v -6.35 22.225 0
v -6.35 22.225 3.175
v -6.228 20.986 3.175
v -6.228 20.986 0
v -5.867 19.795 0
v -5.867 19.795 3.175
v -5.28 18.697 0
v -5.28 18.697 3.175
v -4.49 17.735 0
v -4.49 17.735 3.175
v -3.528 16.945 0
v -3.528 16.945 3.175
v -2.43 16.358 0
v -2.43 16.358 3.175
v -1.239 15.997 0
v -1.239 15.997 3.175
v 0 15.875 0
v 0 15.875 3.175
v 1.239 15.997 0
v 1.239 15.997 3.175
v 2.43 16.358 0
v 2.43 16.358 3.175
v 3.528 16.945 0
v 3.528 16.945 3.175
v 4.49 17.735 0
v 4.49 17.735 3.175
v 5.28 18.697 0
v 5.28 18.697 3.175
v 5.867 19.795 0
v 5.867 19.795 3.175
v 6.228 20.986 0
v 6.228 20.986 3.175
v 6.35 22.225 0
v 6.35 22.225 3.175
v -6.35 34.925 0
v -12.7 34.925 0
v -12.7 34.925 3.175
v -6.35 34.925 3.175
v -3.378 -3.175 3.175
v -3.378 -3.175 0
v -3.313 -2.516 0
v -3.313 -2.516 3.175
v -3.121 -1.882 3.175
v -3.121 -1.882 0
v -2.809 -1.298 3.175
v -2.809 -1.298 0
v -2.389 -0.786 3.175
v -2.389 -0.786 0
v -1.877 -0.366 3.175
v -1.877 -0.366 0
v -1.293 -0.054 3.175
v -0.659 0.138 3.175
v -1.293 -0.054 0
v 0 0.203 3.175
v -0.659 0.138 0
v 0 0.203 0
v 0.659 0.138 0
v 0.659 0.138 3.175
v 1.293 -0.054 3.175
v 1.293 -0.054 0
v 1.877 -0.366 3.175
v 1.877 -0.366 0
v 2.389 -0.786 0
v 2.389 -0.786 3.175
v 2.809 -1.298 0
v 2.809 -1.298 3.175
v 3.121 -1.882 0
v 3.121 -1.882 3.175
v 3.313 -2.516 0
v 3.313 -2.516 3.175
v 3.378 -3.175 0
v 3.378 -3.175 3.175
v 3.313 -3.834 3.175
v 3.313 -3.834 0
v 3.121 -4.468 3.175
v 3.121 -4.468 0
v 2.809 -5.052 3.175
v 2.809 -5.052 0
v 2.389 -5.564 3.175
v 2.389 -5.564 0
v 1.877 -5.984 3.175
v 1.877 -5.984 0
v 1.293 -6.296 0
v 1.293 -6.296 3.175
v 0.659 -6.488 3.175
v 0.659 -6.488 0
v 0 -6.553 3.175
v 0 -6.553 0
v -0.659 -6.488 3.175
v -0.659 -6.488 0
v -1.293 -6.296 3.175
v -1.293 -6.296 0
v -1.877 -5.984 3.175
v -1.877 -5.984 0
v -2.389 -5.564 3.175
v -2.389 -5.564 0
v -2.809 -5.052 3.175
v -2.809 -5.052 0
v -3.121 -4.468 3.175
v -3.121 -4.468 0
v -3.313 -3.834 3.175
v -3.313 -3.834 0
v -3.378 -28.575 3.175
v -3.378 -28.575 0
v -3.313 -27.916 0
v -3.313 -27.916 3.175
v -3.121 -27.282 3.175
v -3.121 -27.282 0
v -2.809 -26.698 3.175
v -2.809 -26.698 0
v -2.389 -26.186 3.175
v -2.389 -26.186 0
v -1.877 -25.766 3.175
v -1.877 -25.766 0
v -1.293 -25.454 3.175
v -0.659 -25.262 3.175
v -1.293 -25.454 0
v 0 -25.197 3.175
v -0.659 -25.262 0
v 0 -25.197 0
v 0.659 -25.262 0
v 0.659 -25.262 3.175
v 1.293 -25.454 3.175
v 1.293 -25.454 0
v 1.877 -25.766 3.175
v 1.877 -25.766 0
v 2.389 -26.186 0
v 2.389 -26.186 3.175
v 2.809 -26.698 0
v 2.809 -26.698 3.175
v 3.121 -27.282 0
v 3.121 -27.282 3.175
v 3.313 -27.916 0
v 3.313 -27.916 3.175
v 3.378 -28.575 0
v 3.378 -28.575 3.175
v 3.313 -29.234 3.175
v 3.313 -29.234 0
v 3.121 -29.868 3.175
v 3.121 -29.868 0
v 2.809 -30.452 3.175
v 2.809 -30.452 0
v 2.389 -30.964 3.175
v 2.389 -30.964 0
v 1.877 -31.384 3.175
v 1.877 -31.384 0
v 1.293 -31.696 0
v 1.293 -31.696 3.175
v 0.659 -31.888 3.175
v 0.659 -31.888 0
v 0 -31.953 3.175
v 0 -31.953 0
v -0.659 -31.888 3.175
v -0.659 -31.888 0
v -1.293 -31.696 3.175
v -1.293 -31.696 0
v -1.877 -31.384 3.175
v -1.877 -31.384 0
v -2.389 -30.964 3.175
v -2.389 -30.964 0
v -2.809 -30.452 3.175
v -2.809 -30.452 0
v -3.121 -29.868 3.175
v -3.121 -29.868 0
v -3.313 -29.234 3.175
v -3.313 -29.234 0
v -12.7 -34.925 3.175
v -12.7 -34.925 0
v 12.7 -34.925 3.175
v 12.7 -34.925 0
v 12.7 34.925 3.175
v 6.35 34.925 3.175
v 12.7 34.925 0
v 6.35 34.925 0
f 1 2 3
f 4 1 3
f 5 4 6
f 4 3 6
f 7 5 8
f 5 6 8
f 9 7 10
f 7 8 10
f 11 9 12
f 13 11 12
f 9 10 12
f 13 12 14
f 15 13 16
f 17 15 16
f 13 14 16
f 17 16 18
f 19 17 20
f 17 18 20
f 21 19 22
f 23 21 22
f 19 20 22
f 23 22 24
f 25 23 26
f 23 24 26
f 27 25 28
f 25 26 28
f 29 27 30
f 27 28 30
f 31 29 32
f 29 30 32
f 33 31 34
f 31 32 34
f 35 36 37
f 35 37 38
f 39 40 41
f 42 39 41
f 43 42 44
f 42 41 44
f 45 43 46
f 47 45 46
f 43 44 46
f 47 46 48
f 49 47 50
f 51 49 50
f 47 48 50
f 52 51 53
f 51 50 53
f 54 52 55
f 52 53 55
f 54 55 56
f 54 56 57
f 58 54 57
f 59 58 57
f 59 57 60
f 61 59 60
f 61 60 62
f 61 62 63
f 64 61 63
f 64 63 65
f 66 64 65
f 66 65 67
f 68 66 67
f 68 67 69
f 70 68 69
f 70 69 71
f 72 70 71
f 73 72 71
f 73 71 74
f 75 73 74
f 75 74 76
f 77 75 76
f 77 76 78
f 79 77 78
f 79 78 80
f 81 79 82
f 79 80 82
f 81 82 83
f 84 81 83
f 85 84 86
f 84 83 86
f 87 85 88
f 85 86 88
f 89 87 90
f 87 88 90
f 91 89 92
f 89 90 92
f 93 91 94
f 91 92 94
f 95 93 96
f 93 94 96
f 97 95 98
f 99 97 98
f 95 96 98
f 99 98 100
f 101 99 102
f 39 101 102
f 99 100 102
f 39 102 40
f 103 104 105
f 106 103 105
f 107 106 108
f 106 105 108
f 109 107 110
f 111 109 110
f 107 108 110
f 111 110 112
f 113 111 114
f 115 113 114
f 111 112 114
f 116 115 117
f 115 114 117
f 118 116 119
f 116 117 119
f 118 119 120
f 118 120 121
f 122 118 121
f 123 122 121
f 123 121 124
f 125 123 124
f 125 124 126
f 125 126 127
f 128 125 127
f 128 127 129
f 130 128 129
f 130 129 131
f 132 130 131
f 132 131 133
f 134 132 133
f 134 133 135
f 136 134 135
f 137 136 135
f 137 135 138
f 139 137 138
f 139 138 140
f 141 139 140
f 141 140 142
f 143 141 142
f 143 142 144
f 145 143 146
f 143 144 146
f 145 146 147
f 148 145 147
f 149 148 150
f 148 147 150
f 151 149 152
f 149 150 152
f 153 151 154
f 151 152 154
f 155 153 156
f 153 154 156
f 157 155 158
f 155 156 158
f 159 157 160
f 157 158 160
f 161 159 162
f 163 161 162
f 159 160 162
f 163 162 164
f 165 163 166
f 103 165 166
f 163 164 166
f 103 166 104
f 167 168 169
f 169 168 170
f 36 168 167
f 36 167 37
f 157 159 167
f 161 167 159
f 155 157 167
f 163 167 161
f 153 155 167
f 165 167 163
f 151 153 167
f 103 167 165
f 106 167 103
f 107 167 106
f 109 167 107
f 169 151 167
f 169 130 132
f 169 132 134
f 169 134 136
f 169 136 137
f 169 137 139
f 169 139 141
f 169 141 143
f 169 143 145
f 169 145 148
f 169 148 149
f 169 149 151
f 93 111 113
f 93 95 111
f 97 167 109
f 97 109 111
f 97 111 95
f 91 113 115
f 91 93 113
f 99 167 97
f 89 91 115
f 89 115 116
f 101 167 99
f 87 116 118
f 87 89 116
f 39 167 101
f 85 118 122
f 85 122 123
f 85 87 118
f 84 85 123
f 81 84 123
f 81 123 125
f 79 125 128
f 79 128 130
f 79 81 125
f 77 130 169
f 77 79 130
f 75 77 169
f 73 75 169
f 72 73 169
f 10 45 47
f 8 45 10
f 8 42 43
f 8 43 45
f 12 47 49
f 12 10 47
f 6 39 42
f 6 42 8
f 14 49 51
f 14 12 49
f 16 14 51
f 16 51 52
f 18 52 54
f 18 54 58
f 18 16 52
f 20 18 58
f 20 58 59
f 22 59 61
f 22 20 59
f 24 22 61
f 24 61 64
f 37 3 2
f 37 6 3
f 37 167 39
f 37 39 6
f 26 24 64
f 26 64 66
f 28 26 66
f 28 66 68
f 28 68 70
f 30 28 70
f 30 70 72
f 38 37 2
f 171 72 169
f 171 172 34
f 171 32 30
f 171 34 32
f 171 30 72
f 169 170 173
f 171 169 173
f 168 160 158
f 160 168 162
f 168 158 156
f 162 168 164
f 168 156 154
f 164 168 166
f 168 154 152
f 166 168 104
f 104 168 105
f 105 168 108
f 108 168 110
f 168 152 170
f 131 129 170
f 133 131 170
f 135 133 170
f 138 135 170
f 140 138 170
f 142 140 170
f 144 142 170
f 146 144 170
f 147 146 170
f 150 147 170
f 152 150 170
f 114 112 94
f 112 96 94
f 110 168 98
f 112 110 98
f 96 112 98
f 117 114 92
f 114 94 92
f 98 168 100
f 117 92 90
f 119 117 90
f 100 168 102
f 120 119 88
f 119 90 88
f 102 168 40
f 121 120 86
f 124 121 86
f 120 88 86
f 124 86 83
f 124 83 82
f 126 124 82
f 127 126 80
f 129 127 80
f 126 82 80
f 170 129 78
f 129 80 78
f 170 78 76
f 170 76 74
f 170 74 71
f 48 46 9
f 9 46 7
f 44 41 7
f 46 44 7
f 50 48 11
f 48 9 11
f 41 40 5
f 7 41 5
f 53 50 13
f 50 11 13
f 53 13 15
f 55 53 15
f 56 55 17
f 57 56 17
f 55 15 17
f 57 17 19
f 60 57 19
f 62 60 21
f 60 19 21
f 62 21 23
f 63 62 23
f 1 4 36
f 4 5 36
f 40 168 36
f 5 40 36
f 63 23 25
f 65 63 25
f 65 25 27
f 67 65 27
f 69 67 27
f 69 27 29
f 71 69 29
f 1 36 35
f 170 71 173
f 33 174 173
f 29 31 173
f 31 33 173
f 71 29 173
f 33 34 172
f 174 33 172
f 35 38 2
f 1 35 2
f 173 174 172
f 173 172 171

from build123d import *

# Parameters (mm, degrees)
SKETCH1_W               = 25.4
SKETCH1_H               = 69.85
BOSS_EXTRUDE1_DEPTH     = 3.175
CUT_EXTRUDE1_DEPTH      = 38.297804895
F_1_4_CLEARANCE_HOLE1_D = 6.7564


with BuildPart() as part:
    # Sketch1 → Boss-Extrude1 (new body)
    with BuildSketch(Plane.XY):
        Rectangle(SKETCH1_W, SKETCH1_H)
    extrude(amount=BOSS_EXTRUDE1_DEPTH)

    # Sketch2 → Cut-Extrude1 (cut, through all)
    with BuildSketch(Plane.XY.offset(3.175)):
        with BuildLine():
            Line((-6.35, 34.925), (-6.35, 22.225))
            ThreePointArc((-6.35, 22.225), (0, 15.875), (6.35, 22.225))
            Line((6.35, 22.225), (6.35, 34.925))
            Line((6.35, 34.925), (-6.35, 34.925))
        make_face()
    extrude(amount=-CUT_EXTRUDE1_DEPTH, mode=Mode.SUBTRACT)

    # 1/4 Clearance Hole1 (through all)
    with Locations(Plane.XY.offset(3.175)):
        with Locations((0, -28.575), (0, -3.175)):
            Hole(F_1_4_CLEARANCE_HOLE1_D / 2)


solid = part.part
